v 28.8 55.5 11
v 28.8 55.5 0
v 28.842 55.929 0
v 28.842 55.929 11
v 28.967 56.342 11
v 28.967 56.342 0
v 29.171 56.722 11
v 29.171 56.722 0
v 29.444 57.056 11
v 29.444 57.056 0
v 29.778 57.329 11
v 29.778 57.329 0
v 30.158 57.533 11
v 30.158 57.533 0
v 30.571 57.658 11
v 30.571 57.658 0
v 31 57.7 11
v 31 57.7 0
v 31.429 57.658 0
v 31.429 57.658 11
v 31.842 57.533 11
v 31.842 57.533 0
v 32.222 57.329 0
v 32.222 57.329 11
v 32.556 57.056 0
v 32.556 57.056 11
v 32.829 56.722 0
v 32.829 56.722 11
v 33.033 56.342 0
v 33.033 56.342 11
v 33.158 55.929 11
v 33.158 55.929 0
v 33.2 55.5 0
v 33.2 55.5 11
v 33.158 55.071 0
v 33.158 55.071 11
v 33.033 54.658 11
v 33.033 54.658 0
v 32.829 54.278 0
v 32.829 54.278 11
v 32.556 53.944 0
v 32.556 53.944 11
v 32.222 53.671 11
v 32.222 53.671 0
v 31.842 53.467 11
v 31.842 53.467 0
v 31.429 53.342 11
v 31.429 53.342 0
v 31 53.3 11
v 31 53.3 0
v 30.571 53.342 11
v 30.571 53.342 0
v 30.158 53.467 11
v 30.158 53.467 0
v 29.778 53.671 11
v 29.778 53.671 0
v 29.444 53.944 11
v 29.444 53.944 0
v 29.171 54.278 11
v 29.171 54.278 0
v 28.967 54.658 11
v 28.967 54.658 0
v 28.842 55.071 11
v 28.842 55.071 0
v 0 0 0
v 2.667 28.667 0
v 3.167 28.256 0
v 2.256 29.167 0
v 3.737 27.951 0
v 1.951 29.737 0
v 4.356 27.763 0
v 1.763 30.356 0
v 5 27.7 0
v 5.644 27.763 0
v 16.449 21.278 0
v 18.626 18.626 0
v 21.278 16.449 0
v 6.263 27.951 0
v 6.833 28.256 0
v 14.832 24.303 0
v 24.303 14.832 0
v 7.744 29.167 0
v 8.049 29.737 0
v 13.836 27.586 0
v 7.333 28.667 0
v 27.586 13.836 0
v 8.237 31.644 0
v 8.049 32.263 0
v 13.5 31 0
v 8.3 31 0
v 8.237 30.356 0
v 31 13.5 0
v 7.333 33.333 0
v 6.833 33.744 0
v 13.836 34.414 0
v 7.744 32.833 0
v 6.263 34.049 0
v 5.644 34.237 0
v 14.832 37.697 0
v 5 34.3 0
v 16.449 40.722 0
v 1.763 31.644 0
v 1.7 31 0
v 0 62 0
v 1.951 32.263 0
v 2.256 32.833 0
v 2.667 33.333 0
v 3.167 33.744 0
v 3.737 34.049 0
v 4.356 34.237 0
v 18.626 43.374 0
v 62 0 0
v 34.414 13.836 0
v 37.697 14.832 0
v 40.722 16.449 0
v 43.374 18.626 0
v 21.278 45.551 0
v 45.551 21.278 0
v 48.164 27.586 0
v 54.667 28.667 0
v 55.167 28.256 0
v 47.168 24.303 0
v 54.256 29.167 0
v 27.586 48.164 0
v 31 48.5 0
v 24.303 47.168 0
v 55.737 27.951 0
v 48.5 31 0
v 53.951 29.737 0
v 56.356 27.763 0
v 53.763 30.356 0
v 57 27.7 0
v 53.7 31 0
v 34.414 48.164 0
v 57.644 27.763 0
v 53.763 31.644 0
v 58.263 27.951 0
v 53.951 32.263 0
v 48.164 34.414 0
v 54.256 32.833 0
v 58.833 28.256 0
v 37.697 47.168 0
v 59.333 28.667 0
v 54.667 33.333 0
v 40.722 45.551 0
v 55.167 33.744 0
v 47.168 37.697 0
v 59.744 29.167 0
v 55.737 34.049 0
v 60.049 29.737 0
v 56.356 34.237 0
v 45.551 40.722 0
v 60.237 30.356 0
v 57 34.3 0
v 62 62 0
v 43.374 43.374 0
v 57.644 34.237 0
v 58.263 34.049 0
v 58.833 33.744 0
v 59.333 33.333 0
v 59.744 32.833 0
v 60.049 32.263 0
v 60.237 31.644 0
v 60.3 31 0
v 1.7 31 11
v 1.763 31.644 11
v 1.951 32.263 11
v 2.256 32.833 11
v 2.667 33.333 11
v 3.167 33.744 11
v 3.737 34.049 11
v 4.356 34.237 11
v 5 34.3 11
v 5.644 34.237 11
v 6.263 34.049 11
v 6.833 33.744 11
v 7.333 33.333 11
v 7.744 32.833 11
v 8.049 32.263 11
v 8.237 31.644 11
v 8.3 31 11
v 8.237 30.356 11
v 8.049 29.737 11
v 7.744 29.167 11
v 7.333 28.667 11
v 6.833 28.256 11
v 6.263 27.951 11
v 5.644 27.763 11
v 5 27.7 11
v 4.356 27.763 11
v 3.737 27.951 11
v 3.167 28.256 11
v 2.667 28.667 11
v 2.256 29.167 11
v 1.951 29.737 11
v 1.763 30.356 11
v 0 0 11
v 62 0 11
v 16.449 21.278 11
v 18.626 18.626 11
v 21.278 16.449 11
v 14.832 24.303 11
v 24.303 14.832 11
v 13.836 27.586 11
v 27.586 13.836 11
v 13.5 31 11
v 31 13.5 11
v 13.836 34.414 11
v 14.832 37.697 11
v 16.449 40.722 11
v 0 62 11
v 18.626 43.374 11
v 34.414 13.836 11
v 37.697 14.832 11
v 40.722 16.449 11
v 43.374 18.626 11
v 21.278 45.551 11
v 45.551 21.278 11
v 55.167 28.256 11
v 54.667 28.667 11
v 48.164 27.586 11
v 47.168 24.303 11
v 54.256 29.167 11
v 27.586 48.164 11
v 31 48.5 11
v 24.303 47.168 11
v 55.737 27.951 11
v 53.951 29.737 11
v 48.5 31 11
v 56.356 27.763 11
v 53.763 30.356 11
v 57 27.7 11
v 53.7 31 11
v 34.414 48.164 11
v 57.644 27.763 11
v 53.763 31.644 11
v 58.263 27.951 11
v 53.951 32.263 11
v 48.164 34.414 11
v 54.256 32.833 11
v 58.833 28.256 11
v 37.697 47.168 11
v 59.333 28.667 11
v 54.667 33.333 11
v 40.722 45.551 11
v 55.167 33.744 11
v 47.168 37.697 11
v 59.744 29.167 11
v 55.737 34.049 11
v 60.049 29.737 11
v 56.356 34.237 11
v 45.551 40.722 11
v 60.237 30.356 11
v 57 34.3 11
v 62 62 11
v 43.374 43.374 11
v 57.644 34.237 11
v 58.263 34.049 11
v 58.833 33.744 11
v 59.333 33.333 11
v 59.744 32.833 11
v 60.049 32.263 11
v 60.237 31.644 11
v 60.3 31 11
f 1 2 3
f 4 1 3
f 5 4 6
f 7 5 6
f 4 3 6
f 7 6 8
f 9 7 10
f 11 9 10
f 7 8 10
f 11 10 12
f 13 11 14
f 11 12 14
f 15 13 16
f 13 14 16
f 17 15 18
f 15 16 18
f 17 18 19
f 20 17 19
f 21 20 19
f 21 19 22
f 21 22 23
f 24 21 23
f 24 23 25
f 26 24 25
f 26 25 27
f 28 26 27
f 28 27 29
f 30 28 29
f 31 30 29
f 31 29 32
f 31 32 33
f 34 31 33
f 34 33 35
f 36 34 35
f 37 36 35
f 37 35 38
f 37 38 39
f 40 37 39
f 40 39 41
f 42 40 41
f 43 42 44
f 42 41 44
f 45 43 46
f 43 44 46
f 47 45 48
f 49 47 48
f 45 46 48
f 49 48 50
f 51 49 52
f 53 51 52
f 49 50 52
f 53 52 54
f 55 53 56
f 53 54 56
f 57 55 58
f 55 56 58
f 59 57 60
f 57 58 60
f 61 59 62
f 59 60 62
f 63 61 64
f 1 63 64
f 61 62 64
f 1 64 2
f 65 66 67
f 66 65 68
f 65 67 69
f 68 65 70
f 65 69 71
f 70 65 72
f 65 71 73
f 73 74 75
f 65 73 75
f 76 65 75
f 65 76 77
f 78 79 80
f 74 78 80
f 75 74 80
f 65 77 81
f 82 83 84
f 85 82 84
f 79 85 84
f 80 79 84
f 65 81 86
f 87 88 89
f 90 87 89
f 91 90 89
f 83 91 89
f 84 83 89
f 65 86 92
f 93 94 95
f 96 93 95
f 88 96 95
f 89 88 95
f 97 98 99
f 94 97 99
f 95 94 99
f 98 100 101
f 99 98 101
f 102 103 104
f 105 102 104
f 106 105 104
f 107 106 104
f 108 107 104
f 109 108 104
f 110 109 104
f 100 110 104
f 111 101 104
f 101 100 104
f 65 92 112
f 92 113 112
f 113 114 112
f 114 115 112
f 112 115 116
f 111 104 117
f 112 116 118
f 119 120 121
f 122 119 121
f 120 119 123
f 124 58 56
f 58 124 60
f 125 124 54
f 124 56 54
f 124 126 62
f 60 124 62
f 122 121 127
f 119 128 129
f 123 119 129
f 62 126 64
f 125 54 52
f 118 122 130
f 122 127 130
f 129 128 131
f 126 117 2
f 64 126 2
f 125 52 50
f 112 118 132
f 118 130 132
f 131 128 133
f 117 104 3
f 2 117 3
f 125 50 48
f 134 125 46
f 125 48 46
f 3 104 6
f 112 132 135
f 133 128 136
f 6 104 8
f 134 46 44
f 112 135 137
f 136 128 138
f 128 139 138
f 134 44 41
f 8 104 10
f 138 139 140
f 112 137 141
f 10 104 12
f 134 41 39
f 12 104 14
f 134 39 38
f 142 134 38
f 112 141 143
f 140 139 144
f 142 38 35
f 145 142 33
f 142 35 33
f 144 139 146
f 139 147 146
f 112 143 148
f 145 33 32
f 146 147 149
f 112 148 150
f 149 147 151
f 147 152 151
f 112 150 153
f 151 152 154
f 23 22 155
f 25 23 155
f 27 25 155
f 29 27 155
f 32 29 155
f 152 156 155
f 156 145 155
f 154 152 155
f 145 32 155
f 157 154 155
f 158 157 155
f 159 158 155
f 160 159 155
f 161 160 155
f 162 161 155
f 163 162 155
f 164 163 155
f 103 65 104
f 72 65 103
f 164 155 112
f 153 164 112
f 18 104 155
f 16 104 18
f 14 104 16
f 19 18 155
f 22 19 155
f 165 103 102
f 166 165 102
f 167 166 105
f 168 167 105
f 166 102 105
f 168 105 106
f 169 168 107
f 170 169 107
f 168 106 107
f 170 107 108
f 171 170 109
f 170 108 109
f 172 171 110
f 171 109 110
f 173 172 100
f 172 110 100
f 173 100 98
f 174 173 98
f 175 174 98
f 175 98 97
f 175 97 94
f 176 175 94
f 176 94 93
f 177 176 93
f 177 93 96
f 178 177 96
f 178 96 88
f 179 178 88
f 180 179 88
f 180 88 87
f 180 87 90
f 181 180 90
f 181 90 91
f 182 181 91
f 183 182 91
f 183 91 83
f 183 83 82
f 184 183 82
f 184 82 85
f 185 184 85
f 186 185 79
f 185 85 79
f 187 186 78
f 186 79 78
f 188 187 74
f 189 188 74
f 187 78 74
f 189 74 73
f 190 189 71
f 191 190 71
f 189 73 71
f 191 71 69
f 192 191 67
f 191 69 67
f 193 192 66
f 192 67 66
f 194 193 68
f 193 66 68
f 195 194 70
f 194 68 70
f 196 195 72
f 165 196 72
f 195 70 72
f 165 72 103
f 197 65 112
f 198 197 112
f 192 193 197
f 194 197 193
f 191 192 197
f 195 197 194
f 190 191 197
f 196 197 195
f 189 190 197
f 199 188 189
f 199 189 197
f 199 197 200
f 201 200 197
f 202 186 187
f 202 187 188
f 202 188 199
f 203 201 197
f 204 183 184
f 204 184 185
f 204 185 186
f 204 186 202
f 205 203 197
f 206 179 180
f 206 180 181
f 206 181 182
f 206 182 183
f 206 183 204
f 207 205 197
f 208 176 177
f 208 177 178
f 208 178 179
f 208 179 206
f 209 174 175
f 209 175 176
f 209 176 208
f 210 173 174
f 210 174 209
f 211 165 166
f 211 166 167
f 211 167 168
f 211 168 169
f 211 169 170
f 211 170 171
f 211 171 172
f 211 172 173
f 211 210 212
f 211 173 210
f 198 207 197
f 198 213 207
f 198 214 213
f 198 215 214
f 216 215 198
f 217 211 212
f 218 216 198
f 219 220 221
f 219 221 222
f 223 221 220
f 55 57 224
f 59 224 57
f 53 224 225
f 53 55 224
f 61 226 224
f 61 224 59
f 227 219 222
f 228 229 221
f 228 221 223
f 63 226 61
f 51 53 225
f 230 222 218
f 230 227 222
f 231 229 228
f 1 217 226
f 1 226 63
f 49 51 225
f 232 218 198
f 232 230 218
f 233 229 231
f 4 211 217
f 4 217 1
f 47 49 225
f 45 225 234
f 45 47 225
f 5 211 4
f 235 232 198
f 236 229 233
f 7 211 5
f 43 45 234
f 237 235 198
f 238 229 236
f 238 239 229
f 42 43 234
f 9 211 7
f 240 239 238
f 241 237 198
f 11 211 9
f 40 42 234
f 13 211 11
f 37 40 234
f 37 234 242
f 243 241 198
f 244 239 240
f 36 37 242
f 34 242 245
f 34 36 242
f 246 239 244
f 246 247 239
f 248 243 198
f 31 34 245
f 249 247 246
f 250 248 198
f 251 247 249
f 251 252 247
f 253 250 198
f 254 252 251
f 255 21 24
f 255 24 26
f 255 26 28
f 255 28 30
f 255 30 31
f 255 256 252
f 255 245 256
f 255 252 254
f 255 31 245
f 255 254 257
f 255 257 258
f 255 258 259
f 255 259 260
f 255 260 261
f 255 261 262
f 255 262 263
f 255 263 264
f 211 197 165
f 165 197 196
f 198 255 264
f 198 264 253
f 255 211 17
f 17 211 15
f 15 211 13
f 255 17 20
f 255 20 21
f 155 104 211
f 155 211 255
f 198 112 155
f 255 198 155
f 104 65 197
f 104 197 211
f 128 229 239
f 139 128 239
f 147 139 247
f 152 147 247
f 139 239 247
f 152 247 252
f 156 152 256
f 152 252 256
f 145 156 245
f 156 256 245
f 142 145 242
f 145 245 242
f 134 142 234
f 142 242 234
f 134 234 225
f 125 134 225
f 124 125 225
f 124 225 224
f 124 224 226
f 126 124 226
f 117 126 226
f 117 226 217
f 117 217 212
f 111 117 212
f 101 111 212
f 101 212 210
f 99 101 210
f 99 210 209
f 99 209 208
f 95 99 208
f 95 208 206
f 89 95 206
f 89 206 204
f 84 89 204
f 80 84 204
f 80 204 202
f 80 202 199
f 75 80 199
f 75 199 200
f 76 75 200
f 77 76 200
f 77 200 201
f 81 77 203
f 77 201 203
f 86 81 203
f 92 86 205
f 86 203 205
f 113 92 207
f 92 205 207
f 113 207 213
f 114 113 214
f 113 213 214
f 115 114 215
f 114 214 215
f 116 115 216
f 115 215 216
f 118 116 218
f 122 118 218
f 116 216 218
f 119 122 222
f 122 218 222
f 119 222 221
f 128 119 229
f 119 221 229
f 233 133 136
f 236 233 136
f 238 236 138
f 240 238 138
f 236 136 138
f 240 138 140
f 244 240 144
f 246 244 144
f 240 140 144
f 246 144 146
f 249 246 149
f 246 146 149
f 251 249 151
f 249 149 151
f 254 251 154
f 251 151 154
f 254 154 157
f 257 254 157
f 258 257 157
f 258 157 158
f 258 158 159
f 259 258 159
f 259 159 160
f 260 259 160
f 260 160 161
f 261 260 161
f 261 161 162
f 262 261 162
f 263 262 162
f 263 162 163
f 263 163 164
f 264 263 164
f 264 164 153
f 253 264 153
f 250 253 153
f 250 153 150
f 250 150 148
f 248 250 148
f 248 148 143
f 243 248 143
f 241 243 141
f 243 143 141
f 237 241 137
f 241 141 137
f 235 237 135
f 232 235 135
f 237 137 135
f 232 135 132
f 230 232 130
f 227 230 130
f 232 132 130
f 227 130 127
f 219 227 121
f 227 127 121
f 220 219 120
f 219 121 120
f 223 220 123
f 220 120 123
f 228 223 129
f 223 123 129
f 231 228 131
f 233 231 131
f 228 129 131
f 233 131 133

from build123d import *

# Parameters (mm, degrees)
F0_W     = 62
F0_H     = 62
F1_DEPTH = 11
F3_D     = 6.6
F5_D     = 4.4
F6_R     = 17.5
F7_DEPTH = 11.001


with BuildPart() as f1:
    # F0 (on Top) → F1 (new body)
    with BuildSketch(Plane.XY):
        with Locations((31, 31)):
            Rectangle(F0_W, F0_H)
    extrude(amount=F1_DEPTH)

    # F3 (through all)
    with Locations(Plane.XY.offset(11)):
        with Locations((5, 31), (57, 31)):
            Hole(F3_D / 2)

    # F5 (through all)
    with Locations(Plane.XY.offset(11)):
        with Locations((31, 55.5)):
            Hole(F5_D / 2)

    # F6 (on face) → F7 (cut, through all)
    with BuildSketch(Plane.XY.offset(11)):
        with Locations((31, 31)):
            Circle(F6_R)
    extrude(amount=-F7_DEPTH, mode=Mode.SUBTRACT)


solid = f1.part
